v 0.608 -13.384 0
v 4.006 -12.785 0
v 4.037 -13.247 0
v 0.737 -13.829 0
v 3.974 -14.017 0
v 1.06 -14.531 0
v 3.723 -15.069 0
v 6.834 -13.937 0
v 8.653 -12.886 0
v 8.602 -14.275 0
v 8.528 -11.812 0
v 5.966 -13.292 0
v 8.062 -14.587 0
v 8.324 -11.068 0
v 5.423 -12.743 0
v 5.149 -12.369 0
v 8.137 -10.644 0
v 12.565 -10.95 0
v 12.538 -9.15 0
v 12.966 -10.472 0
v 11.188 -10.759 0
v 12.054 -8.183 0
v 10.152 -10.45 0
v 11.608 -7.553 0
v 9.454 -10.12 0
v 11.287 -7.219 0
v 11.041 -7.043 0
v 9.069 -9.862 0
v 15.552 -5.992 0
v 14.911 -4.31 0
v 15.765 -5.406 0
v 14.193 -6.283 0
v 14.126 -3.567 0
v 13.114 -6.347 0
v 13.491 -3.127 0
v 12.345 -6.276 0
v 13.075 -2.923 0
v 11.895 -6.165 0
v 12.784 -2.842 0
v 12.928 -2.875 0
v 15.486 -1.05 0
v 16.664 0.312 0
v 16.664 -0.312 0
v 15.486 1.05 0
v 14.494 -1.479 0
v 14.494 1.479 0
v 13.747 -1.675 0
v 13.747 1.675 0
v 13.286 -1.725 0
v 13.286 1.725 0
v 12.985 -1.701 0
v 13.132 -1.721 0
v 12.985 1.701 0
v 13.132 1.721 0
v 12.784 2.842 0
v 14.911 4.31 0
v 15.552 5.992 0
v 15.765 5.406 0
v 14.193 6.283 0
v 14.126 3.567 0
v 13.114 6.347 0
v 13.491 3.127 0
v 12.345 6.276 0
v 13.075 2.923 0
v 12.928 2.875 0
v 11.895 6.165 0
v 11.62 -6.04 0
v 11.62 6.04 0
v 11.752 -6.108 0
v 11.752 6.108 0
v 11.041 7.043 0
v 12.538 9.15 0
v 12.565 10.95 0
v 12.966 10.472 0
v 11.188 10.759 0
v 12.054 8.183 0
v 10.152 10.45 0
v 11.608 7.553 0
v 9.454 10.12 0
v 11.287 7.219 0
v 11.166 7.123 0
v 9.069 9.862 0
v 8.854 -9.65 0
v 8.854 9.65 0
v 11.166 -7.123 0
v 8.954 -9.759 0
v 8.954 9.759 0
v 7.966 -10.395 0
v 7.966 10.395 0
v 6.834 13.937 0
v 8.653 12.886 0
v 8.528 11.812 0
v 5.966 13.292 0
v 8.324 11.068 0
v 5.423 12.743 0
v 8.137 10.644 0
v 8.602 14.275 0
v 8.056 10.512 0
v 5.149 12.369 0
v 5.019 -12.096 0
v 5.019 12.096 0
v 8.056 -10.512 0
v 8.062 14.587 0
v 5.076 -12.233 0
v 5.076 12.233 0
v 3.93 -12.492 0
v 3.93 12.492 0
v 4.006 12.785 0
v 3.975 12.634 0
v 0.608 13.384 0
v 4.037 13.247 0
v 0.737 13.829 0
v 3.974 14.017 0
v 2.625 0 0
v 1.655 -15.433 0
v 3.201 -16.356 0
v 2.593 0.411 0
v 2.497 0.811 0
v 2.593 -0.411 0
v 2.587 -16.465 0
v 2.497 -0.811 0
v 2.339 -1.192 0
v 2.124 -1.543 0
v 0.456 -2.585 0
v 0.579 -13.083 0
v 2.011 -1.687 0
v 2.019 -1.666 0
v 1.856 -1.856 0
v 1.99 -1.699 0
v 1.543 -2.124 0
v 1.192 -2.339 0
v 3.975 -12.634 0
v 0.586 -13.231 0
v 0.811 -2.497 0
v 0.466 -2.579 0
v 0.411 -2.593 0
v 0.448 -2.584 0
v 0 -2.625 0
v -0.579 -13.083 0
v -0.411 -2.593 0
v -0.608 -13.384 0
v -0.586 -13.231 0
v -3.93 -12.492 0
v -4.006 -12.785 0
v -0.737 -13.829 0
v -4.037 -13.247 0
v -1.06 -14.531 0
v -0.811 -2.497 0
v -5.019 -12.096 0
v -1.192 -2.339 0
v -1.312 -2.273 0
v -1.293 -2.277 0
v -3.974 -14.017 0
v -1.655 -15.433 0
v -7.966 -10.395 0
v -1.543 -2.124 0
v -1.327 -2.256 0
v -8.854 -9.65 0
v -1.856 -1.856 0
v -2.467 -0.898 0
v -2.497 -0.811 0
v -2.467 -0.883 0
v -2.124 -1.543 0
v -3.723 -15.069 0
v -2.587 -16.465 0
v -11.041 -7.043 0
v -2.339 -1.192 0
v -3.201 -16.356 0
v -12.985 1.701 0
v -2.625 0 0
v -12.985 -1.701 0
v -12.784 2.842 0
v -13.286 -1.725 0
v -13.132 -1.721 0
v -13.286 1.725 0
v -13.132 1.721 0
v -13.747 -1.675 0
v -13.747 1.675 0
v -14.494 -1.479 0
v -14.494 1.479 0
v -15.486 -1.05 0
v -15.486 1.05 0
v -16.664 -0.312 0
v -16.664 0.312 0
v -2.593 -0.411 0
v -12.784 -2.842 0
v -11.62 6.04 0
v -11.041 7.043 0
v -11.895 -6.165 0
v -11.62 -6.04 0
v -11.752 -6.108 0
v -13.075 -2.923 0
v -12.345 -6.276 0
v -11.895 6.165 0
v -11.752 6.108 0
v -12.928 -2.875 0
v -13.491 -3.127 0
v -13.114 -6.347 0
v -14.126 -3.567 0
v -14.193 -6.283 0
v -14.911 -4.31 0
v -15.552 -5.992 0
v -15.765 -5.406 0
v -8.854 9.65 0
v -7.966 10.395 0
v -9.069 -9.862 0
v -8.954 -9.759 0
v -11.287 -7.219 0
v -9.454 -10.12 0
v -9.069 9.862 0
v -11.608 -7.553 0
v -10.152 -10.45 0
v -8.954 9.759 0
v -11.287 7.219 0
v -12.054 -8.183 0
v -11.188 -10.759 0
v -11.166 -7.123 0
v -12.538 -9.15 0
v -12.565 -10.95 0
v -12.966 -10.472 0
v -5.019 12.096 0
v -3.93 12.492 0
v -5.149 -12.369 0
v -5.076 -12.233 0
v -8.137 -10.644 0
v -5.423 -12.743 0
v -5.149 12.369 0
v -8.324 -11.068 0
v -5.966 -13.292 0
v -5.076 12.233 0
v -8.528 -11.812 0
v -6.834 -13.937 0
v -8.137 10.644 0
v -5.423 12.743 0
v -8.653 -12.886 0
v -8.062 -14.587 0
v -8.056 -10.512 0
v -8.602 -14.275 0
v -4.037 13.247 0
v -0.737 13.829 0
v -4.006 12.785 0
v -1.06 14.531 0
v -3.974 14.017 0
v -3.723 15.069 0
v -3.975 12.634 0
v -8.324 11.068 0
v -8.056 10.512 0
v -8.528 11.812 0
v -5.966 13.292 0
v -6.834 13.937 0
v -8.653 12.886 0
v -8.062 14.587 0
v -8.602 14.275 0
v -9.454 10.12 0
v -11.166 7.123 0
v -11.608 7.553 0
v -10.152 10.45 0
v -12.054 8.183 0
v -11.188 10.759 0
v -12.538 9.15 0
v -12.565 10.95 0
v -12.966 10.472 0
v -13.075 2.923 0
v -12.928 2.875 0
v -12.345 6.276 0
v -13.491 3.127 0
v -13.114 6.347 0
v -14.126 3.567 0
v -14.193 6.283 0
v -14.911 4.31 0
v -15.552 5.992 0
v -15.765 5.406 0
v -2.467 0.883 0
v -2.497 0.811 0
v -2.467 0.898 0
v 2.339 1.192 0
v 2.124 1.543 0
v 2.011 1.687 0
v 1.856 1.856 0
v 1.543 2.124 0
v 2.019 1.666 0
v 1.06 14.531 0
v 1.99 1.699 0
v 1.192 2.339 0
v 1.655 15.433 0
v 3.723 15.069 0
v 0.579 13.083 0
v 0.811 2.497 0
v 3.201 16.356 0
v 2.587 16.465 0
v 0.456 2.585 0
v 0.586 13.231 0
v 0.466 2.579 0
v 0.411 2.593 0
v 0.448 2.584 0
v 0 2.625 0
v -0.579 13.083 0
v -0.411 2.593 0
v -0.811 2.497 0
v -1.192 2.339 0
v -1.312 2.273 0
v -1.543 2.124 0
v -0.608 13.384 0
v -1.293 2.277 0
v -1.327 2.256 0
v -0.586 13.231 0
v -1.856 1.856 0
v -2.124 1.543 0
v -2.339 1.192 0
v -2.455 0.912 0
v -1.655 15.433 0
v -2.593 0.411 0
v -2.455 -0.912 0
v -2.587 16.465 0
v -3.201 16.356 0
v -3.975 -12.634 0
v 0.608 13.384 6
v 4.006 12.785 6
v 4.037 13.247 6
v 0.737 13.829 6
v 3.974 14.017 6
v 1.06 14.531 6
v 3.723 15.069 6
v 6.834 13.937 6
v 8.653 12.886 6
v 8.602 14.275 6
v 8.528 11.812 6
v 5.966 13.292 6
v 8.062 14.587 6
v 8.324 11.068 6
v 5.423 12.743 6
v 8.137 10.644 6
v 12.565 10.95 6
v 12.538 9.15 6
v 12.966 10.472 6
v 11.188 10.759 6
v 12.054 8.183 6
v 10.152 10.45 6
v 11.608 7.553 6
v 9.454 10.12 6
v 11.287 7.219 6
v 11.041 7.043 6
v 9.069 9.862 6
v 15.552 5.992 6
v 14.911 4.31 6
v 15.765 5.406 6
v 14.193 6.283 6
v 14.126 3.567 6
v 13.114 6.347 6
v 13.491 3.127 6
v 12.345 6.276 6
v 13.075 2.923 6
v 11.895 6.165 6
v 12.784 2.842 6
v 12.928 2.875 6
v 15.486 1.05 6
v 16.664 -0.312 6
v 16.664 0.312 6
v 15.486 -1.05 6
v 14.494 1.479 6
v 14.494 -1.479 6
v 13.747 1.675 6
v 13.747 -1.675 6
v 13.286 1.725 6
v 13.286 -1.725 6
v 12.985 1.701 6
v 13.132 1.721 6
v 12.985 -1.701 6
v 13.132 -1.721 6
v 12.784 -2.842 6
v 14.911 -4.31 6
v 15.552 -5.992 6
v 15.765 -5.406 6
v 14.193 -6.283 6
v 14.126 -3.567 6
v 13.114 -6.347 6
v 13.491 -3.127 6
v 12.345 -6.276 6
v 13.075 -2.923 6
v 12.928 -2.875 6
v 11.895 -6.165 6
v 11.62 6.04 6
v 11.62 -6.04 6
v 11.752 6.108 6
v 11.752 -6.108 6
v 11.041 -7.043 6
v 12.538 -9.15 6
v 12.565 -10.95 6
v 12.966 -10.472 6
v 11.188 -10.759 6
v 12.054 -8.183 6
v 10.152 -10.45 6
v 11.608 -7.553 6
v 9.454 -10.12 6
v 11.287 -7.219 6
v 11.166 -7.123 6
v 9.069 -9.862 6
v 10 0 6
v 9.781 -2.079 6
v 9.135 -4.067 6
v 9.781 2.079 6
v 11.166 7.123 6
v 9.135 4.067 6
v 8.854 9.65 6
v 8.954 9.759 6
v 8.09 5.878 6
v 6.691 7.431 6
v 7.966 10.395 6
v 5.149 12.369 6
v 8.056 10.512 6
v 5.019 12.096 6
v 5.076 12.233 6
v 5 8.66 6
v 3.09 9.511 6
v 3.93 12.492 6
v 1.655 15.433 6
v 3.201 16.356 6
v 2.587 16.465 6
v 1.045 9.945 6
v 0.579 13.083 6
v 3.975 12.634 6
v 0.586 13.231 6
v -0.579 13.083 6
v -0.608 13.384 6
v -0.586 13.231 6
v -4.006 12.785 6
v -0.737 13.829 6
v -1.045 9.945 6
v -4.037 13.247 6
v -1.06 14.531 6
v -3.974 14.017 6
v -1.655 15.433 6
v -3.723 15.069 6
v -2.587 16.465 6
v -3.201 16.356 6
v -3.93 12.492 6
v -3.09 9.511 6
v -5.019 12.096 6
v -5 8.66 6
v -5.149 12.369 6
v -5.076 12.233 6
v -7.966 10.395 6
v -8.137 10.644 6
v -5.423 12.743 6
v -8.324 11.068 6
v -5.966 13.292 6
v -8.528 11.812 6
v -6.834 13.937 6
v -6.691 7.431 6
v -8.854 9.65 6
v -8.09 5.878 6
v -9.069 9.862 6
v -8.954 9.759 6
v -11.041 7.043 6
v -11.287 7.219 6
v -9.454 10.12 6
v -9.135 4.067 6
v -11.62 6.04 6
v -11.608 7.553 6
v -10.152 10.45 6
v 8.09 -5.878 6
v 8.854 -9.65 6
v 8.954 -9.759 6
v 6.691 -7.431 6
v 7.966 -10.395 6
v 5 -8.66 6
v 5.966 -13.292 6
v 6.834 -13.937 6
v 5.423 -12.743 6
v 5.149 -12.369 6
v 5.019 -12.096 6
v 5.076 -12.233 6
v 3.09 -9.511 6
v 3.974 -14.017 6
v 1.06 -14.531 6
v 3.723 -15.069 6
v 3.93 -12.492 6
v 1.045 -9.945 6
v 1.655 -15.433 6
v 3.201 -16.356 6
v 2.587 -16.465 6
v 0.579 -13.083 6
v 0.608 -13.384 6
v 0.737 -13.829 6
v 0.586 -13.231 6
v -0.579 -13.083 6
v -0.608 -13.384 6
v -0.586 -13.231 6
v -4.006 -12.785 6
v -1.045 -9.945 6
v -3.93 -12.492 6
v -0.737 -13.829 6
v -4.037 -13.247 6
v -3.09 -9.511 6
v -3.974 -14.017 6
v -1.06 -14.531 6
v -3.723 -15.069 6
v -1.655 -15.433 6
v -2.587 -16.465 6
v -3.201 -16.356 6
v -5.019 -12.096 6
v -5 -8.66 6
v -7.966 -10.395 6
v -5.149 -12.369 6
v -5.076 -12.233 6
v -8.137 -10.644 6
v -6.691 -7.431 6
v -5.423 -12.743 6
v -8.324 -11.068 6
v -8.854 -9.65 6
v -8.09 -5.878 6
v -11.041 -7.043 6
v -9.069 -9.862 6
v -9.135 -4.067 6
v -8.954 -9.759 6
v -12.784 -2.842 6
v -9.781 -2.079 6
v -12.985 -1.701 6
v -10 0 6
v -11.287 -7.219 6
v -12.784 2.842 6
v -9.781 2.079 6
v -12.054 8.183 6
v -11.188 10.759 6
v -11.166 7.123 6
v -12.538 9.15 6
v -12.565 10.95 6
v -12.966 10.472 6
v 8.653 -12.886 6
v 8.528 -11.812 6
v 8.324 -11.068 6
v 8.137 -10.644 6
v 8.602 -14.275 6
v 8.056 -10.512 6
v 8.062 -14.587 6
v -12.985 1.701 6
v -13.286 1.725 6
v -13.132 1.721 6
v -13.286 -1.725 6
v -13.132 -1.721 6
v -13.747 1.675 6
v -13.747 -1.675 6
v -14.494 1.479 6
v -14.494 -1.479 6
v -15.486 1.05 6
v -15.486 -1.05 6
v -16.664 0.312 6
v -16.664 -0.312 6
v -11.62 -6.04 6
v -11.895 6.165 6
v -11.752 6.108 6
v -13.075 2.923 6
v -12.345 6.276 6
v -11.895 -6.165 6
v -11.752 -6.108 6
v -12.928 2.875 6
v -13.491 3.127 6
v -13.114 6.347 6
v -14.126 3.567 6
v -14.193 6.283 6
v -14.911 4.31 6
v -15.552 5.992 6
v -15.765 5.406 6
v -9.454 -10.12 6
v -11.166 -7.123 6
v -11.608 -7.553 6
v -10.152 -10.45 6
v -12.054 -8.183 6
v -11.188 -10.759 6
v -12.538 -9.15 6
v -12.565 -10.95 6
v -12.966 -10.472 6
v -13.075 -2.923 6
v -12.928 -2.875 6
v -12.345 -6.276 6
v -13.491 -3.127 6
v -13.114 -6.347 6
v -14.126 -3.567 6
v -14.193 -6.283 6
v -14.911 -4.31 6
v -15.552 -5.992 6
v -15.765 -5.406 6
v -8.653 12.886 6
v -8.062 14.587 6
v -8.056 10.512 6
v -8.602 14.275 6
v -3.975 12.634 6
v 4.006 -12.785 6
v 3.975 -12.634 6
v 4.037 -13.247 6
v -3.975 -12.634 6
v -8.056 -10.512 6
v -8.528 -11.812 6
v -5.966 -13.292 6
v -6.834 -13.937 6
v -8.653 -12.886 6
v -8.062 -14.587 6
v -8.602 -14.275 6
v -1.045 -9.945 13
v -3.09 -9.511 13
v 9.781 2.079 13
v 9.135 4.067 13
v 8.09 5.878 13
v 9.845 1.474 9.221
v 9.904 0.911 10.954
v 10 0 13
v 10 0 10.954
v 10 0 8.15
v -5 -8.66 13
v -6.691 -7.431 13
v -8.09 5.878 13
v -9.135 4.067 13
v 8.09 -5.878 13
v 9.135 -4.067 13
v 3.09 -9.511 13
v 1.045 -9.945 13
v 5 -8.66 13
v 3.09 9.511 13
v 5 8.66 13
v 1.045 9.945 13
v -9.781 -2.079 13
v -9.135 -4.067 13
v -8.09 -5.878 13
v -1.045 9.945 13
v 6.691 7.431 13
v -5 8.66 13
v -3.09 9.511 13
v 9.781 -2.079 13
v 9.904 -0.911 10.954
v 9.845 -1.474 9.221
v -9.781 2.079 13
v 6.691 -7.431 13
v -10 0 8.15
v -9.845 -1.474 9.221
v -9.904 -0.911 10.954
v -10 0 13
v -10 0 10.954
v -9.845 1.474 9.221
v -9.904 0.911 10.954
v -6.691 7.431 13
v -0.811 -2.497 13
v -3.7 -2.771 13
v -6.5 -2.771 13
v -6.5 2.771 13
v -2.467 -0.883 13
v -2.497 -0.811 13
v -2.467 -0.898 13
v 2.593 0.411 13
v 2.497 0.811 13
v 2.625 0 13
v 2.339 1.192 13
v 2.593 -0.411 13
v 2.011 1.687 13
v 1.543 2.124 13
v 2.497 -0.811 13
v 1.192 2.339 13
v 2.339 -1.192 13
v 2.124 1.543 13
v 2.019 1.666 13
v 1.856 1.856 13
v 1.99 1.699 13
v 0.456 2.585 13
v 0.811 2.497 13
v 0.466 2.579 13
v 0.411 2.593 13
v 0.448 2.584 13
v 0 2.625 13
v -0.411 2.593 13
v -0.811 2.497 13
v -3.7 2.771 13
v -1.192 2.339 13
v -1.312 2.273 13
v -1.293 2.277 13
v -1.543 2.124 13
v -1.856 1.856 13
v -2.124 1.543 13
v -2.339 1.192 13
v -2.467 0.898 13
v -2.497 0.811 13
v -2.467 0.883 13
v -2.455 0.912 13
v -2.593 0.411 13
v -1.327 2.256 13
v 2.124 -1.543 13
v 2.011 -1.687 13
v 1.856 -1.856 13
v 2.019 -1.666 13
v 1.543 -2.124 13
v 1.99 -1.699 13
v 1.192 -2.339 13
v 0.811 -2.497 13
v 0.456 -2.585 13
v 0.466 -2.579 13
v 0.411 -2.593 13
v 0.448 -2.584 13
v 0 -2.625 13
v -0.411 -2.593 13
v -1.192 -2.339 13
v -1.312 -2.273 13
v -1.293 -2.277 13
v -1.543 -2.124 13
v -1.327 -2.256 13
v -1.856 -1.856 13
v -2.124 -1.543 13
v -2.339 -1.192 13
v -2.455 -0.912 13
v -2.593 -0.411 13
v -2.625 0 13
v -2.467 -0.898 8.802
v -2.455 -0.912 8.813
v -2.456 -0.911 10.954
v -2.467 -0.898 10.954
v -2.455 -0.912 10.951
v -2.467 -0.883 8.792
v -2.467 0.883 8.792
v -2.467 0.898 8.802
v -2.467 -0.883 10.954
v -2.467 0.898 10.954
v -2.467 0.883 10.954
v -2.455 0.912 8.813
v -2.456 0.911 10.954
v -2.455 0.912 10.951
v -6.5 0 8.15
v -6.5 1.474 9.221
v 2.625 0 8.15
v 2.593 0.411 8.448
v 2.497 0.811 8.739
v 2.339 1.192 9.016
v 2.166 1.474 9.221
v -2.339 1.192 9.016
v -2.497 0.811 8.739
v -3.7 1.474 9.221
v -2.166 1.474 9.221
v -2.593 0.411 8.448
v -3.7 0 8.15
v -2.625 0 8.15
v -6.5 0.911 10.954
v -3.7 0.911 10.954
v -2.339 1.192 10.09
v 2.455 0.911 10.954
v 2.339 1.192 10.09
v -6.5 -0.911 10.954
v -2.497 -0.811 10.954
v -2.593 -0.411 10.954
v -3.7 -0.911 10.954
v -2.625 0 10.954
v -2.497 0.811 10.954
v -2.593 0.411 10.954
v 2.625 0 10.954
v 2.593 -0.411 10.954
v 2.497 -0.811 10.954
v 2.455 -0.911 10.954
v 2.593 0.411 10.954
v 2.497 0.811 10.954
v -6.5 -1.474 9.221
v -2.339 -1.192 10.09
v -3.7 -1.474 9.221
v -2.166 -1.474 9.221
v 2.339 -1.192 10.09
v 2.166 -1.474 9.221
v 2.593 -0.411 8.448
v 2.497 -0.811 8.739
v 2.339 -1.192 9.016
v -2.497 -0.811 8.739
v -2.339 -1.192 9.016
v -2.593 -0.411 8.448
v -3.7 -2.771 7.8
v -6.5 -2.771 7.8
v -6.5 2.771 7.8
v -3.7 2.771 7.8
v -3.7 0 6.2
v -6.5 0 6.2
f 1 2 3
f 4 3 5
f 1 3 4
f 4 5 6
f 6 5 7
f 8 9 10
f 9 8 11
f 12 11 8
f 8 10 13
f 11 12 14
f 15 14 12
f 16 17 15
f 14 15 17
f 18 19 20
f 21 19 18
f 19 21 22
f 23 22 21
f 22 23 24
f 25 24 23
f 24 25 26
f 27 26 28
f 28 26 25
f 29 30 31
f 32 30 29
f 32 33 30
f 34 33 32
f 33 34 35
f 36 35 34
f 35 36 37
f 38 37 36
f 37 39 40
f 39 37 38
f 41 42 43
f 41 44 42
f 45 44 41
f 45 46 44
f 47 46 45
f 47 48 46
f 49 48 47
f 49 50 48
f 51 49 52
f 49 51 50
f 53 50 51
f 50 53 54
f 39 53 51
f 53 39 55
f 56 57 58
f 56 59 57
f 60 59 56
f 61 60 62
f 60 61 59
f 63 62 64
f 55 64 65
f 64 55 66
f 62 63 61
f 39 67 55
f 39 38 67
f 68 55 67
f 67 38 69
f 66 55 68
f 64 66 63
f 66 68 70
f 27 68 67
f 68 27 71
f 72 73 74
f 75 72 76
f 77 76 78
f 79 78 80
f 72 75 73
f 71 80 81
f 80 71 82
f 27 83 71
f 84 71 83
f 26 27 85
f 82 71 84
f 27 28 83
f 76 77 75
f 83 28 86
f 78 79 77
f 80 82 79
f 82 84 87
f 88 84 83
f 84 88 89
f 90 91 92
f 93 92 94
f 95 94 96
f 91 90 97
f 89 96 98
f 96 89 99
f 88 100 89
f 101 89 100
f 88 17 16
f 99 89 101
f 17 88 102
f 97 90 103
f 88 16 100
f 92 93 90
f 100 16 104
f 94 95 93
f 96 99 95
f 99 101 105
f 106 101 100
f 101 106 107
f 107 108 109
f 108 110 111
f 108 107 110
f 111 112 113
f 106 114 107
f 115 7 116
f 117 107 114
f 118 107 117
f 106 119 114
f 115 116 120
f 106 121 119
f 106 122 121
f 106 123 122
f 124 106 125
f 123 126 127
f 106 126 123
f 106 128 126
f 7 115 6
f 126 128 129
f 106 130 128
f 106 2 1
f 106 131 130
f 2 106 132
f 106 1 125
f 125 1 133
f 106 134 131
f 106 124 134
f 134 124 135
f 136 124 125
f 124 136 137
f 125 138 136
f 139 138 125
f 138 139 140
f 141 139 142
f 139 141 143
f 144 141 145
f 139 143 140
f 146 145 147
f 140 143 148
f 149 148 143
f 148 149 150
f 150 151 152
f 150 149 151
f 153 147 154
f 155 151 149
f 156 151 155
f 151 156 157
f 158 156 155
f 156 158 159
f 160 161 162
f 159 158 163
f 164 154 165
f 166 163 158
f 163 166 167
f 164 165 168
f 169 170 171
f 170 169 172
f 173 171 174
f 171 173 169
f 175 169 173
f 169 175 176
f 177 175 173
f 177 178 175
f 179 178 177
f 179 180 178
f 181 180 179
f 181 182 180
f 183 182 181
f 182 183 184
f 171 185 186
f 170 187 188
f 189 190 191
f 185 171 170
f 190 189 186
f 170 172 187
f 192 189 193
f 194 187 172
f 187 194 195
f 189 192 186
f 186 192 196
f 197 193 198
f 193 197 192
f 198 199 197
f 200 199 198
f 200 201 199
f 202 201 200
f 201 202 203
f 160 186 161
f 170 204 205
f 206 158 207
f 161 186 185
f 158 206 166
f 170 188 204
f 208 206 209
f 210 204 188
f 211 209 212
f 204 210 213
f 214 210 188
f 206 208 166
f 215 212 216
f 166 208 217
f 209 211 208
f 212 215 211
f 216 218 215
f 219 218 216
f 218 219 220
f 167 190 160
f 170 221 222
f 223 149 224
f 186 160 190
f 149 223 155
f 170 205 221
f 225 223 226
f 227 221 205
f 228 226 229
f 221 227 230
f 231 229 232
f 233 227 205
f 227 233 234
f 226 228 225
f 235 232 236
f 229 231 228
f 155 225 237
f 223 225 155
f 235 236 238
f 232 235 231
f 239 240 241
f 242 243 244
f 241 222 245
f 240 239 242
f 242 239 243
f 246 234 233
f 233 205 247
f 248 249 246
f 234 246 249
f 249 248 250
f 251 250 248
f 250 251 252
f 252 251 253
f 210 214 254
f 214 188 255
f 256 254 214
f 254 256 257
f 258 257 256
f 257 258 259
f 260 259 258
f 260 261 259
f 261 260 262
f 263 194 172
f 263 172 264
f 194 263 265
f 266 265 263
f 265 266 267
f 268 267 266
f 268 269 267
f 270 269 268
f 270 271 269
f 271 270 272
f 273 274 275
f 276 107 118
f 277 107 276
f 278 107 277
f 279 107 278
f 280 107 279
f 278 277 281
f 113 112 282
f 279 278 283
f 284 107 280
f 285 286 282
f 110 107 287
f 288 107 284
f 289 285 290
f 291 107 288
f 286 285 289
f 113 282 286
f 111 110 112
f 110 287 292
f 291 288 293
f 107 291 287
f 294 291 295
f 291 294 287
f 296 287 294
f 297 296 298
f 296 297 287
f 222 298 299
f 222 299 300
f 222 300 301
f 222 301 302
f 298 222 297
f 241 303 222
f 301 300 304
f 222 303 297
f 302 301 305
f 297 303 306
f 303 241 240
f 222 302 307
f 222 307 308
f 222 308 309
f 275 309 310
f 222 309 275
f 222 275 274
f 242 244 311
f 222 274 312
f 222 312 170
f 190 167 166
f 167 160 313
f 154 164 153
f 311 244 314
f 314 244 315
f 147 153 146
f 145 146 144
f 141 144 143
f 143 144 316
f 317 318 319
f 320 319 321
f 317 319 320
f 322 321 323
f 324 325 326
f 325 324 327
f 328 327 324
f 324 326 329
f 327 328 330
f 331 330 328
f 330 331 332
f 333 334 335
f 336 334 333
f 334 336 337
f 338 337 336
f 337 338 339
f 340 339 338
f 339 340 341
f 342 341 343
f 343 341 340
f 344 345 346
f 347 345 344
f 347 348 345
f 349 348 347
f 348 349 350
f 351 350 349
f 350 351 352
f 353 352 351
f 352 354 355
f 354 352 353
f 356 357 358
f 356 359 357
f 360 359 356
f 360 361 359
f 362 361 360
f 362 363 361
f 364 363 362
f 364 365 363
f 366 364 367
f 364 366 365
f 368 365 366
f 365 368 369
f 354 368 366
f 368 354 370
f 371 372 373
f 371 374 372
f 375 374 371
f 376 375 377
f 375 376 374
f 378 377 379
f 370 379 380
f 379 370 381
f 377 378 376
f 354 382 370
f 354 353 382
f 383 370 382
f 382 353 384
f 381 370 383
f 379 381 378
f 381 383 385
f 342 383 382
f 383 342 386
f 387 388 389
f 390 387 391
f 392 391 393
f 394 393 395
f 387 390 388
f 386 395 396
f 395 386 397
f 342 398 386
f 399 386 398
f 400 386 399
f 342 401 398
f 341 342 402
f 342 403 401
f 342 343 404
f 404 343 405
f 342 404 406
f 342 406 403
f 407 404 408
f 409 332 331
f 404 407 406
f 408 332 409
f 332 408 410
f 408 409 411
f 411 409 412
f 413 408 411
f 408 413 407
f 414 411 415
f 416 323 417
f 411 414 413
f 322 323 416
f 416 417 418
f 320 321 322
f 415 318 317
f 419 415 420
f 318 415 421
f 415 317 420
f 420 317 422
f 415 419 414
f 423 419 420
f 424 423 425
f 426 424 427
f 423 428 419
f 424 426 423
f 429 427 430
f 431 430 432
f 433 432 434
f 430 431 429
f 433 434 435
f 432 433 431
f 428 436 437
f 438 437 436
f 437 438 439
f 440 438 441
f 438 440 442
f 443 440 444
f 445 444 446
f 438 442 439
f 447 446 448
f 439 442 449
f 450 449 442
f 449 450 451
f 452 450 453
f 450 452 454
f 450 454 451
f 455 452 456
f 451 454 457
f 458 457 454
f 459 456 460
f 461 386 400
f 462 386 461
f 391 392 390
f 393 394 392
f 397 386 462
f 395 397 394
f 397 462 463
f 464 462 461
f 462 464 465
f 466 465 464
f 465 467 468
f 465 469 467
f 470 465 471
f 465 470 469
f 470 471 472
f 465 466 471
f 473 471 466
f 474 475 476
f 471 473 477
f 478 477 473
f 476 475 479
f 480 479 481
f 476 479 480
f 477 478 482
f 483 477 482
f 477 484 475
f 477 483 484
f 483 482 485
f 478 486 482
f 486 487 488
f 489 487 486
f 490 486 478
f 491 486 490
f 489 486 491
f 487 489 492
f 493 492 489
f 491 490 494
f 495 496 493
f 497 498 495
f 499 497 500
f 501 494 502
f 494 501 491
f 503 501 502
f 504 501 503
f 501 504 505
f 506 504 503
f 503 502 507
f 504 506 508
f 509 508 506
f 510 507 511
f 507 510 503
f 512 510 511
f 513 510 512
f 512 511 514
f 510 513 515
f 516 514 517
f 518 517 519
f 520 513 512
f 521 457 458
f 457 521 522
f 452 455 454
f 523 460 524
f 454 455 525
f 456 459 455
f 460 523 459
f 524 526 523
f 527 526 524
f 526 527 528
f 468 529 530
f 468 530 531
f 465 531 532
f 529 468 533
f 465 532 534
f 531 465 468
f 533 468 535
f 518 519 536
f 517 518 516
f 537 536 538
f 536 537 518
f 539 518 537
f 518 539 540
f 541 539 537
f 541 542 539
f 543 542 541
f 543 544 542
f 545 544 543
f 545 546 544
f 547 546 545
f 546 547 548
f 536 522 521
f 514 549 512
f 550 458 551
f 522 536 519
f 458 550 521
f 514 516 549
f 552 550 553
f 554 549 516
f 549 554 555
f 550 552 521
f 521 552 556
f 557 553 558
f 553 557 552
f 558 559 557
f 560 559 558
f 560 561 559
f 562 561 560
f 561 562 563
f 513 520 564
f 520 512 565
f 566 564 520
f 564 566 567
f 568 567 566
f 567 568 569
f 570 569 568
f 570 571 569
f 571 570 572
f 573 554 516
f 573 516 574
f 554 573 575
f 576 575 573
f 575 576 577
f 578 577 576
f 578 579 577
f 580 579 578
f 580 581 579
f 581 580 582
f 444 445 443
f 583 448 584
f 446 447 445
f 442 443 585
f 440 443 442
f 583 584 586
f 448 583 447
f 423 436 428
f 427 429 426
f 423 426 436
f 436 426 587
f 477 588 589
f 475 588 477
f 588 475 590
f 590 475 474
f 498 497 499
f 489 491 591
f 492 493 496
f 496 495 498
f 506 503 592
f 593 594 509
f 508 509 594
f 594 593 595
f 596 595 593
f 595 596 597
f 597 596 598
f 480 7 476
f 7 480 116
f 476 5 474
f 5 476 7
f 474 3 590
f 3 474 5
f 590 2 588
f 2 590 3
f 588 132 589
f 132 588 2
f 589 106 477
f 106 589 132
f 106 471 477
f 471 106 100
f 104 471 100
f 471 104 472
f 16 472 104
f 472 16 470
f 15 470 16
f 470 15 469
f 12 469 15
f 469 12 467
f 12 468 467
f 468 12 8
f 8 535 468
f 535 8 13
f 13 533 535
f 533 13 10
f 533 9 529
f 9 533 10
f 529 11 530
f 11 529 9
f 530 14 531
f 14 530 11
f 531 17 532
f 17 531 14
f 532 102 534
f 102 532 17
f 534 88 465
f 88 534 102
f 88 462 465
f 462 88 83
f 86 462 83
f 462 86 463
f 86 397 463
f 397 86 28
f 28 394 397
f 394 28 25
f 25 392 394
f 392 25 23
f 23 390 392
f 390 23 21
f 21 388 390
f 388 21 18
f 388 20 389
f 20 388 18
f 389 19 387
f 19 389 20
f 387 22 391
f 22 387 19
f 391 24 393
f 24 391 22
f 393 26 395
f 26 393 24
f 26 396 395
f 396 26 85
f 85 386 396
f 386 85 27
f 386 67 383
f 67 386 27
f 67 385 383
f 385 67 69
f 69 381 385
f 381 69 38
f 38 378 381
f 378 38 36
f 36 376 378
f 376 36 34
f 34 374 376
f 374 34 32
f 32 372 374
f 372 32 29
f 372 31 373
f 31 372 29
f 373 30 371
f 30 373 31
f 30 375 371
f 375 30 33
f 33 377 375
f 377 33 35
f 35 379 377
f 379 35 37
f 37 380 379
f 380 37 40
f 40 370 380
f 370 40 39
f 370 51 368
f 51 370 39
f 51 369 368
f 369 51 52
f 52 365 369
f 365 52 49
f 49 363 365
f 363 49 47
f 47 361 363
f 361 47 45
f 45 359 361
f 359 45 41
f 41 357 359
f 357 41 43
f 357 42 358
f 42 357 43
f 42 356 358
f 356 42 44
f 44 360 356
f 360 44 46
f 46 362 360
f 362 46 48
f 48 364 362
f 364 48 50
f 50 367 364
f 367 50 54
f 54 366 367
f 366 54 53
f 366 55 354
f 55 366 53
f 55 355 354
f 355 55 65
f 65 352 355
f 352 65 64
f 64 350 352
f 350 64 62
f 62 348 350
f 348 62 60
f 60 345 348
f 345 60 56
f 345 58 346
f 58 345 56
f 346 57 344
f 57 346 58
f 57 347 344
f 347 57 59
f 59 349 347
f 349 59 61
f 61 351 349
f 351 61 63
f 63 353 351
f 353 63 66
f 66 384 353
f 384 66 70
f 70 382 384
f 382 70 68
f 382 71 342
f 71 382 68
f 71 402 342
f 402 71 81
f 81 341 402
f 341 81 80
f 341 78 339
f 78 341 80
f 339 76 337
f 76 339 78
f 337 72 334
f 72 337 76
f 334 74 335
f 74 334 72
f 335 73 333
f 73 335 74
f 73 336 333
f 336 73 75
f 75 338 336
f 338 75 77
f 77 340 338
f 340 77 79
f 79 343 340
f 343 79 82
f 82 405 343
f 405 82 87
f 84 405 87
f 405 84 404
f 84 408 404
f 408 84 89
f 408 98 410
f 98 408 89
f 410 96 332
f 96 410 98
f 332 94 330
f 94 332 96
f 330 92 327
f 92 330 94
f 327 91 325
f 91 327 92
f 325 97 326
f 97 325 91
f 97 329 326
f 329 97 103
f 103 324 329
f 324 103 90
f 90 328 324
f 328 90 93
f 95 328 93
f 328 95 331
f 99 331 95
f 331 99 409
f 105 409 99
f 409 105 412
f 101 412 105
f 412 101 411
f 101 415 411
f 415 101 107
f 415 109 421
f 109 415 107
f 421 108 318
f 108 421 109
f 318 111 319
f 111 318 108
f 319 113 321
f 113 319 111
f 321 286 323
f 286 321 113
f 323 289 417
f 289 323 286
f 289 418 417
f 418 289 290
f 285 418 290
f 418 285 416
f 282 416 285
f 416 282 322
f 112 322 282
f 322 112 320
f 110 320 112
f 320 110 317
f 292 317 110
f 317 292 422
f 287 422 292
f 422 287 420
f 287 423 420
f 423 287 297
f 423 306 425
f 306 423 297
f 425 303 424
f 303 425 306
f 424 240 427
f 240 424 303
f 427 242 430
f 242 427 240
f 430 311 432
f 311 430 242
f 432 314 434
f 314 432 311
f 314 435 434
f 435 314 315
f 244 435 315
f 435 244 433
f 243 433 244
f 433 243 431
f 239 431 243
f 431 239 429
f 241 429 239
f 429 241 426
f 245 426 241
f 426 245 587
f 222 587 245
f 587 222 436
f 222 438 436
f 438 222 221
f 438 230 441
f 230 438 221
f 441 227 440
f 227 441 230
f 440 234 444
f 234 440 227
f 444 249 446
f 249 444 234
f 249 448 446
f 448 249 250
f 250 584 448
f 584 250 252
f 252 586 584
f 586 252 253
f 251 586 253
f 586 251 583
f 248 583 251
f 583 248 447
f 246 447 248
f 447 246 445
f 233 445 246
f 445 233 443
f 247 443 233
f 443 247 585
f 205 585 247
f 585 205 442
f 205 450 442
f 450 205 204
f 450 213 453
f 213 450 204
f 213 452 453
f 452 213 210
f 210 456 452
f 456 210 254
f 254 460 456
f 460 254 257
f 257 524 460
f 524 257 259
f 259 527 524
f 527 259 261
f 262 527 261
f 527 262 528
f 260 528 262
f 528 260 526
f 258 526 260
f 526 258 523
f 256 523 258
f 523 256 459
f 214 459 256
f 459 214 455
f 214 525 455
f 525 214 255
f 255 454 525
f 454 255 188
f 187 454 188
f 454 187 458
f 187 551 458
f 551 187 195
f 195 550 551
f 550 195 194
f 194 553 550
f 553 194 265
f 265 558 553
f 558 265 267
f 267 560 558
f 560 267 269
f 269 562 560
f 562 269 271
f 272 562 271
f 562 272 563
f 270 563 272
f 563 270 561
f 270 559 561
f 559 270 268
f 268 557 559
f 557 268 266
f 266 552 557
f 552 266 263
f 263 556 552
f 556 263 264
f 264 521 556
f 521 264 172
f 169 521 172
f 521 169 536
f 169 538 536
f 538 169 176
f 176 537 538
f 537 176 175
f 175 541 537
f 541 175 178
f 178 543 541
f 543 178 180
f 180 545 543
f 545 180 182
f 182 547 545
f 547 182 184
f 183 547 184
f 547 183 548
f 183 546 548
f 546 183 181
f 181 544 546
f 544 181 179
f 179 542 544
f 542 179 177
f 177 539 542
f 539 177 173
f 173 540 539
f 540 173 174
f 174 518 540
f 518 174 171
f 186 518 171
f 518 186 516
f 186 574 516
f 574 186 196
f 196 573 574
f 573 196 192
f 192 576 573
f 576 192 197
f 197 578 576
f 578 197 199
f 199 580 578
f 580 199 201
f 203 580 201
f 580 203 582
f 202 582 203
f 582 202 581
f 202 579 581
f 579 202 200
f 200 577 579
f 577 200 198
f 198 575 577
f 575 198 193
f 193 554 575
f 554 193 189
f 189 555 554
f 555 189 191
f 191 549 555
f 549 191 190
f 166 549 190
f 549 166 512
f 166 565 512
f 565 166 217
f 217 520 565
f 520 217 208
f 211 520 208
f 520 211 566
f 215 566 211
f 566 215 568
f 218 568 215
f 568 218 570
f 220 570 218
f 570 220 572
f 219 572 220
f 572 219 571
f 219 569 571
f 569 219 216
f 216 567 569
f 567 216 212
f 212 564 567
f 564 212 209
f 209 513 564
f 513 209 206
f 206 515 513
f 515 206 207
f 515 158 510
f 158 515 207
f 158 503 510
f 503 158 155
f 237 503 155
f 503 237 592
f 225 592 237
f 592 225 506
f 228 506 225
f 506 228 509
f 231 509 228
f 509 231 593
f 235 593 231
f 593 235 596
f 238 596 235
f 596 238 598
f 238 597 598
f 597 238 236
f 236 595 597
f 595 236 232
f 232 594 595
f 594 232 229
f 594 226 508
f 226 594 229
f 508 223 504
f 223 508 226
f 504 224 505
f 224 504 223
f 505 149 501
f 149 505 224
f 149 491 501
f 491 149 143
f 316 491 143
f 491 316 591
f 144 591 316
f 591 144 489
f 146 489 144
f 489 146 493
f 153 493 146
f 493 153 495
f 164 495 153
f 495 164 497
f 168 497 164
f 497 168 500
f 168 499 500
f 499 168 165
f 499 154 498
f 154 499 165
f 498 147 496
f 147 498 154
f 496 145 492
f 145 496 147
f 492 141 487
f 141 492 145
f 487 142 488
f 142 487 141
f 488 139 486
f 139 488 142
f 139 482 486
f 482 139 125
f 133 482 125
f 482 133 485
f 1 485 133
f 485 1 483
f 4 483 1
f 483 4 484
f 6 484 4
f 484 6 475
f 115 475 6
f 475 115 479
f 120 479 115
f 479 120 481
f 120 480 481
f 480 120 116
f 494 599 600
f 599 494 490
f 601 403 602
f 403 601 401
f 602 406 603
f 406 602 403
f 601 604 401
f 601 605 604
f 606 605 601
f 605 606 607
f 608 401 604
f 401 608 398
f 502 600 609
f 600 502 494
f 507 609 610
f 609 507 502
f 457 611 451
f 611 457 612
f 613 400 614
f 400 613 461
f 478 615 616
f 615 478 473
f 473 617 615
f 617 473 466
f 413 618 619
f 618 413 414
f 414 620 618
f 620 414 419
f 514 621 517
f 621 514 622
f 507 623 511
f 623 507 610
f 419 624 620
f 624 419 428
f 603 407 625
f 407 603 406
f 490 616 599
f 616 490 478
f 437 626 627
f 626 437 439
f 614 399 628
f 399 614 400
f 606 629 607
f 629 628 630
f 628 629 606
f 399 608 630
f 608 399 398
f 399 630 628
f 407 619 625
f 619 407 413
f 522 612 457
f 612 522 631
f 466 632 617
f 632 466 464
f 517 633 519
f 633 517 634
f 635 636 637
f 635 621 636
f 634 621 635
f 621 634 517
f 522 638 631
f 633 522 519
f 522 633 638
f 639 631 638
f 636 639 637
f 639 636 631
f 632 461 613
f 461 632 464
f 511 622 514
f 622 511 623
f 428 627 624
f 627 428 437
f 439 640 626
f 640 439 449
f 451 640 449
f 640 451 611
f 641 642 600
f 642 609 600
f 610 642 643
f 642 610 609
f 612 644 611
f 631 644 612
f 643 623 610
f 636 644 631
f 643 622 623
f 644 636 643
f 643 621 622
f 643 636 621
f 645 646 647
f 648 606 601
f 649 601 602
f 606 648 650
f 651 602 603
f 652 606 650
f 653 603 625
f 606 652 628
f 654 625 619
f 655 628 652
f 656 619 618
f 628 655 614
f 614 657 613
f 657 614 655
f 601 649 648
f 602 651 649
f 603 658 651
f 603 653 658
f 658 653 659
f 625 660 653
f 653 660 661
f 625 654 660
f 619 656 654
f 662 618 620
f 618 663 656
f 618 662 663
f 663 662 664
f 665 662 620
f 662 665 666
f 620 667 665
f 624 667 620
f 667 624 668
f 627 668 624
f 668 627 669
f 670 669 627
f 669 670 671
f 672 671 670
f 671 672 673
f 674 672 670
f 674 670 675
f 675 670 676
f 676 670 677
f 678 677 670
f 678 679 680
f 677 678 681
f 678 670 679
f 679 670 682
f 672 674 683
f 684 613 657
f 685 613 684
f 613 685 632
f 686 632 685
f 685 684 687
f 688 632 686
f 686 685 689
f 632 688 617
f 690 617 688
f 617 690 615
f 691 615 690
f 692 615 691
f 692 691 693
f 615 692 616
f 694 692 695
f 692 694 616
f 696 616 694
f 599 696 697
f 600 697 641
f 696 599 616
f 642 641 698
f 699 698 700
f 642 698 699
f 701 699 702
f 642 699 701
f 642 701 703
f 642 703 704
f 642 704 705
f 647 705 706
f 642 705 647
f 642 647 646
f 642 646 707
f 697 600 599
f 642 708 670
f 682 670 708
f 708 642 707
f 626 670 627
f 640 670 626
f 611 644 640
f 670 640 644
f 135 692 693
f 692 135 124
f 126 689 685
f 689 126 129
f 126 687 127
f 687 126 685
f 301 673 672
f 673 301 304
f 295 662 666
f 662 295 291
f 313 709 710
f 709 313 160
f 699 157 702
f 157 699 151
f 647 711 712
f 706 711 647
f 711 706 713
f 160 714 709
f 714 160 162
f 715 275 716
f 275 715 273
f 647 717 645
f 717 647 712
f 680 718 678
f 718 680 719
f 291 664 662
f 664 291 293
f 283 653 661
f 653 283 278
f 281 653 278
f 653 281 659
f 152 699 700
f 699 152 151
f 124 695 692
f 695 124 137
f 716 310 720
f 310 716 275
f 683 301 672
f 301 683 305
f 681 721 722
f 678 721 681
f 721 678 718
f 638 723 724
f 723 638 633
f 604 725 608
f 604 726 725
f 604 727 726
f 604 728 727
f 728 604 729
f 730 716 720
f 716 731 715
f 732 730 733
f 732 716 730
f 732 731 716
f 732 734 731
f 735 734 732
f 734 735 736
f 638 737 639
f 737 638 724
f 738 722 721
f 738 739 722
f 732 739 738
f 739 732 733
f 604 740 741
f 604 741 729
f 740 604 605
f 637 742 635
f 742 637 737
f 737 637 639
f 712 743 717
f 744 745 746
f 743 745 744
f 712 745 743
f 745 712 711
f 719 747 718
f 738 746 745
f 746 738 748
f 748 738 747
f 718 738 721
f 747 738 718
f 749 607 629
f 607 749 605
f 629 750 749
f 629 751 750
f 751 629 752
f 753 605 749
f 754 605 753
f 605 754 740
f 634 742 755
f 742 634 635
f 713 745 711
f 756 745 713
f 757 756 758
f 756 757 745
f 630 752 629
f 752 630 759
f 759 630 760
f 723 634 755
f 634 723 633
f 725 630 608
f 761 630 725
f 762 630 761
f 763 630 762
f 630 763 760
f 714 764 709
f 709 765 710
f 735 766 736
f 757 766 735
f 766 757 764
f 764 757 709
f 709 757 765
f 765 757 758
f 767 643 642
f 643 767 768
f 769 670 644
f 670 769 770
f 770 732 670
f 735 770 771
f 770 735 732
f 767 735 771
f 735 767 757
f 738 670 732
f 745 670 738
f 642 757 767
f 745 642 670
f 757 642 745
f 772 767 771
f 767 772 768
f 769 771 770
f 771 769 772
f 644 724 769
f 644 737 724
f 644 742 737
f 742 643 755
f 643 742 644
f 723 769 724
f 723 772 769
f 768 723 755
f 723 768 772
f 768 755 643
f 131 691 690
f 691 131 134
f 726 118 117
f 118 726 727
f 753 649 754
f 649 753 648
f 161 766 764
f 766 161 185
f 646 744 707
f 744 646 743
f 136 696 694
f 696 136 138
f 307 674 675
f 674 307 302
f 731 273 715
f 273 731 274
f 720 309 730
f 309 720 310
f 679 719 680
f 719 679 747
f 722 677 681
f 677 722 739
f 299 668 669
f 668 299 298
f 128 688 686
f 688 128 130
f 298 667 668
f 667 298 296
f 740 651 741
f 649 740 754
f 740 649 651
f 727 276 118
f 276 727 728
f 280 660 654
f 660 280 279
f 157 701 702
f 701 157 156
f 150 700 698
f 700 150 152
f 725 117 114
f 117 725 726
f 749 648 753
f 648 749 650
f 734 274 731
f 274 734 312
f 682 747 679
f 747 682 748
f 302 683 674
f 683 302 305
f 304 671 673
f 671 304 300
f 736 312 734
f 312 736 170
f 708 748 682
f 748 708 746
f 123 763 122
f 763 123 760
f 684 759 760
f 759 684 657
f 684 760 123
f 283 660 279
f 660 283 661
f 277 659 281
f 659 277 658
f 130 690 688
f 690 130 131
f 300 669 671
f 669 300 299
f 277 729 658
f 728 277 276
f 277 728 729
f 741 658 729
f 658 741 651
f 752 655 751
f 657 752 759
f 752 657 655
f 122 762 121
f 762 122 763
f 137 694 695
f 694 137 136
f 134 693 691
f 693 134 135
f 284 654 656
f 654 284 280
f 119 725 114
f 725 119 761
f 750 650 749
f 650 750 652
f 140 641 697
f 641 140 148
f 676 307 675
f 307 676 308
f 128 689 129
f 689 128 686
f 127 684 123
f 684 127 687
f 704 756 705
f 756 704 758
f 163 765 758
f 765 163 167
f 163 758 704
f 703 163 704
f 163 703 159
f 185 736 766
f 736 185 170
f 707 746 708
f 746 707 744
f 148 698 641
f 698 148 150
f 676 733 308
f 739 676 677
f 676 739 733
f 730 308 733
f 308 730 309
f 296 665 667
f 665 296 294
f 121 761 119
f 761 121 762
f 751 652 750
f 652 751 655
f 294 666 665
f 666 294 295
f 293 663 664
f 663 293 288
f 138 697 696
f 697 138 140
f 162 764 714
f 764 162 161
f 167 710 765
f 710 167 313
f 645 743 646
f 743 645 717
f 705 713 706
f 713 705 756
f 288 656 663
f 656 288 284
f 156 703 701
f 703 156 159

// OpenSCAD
/**
 * gears.scad
 * 
 * Gear set for the pendulum extruder
 * 
 * Created by Diego Viejo
 * License GPL 3.0
 * 
 */

use<include/MCAD/involute_gears.scad>


// piñon del motor. Radio = 10
*difference()
{
    union()
    {
        cylinder(r=9.25, h=7);
        gear (circular_pitch=300,
            number_of_teeth = 9,
            gear_thickness = 7+7,
            rim_thickness = 7+7,
            hub_thickness = 7+7,
            hub_diameter = 10,
	    bore_diameter = 5.25,
            circles=0);
    }
    
    translate([-50, 0, 6.6/2]) rotate([0, 90, 0]) cylinder(d=3.1, h=50);
    hull()
    {
      #translate([-6.5, 0, 6.6/2+0.3]) rotate([0, 90, 0]) cylinder(d=6.4, h=2.8, $fn=6);
      translate([-6.5, 0, -50]) rotate([0, 90, 0]) cylinder(d=6.4, h=2.8, $fn=6);
    }
    translate([0, 0, -0.1]) cylinder(d=5.25, h=30, $fn=40);
}


//Corona. Radio = 30
alturaCorona = 6+7;
//translate([40+10, 0, 0])
difference()
{
    gear (circular_pitch=300,
	number_of_teeth = 18,
	gear_thickness = 6,
	rim_thickness = 6,
	hub_thickness = alturaCorona,
        hub_diameter = 20,
	bore_diameter = 5.25,
	circles=0);

    translate([-25, 0, alturaCorona-6.6/2]) rotate([0, 90, 0]) cylinder(d=3.1, h=50);
    hull()
    {
      #translate([-6.5, 0, alturaCorona-6.6/2-0.3]) rotate([0, 90, 0]) cylinder(d=6.4, h=2.8, $fn=6);
      translate([-6.5, 0, 50]) rotate([0, 90, 0]) cylinder(d=6.4, h=2.8, $fn=6);
    }
    translate([0, 0, -0.1]) cylinder(d=5.25, h=30, $fn=40);
}
